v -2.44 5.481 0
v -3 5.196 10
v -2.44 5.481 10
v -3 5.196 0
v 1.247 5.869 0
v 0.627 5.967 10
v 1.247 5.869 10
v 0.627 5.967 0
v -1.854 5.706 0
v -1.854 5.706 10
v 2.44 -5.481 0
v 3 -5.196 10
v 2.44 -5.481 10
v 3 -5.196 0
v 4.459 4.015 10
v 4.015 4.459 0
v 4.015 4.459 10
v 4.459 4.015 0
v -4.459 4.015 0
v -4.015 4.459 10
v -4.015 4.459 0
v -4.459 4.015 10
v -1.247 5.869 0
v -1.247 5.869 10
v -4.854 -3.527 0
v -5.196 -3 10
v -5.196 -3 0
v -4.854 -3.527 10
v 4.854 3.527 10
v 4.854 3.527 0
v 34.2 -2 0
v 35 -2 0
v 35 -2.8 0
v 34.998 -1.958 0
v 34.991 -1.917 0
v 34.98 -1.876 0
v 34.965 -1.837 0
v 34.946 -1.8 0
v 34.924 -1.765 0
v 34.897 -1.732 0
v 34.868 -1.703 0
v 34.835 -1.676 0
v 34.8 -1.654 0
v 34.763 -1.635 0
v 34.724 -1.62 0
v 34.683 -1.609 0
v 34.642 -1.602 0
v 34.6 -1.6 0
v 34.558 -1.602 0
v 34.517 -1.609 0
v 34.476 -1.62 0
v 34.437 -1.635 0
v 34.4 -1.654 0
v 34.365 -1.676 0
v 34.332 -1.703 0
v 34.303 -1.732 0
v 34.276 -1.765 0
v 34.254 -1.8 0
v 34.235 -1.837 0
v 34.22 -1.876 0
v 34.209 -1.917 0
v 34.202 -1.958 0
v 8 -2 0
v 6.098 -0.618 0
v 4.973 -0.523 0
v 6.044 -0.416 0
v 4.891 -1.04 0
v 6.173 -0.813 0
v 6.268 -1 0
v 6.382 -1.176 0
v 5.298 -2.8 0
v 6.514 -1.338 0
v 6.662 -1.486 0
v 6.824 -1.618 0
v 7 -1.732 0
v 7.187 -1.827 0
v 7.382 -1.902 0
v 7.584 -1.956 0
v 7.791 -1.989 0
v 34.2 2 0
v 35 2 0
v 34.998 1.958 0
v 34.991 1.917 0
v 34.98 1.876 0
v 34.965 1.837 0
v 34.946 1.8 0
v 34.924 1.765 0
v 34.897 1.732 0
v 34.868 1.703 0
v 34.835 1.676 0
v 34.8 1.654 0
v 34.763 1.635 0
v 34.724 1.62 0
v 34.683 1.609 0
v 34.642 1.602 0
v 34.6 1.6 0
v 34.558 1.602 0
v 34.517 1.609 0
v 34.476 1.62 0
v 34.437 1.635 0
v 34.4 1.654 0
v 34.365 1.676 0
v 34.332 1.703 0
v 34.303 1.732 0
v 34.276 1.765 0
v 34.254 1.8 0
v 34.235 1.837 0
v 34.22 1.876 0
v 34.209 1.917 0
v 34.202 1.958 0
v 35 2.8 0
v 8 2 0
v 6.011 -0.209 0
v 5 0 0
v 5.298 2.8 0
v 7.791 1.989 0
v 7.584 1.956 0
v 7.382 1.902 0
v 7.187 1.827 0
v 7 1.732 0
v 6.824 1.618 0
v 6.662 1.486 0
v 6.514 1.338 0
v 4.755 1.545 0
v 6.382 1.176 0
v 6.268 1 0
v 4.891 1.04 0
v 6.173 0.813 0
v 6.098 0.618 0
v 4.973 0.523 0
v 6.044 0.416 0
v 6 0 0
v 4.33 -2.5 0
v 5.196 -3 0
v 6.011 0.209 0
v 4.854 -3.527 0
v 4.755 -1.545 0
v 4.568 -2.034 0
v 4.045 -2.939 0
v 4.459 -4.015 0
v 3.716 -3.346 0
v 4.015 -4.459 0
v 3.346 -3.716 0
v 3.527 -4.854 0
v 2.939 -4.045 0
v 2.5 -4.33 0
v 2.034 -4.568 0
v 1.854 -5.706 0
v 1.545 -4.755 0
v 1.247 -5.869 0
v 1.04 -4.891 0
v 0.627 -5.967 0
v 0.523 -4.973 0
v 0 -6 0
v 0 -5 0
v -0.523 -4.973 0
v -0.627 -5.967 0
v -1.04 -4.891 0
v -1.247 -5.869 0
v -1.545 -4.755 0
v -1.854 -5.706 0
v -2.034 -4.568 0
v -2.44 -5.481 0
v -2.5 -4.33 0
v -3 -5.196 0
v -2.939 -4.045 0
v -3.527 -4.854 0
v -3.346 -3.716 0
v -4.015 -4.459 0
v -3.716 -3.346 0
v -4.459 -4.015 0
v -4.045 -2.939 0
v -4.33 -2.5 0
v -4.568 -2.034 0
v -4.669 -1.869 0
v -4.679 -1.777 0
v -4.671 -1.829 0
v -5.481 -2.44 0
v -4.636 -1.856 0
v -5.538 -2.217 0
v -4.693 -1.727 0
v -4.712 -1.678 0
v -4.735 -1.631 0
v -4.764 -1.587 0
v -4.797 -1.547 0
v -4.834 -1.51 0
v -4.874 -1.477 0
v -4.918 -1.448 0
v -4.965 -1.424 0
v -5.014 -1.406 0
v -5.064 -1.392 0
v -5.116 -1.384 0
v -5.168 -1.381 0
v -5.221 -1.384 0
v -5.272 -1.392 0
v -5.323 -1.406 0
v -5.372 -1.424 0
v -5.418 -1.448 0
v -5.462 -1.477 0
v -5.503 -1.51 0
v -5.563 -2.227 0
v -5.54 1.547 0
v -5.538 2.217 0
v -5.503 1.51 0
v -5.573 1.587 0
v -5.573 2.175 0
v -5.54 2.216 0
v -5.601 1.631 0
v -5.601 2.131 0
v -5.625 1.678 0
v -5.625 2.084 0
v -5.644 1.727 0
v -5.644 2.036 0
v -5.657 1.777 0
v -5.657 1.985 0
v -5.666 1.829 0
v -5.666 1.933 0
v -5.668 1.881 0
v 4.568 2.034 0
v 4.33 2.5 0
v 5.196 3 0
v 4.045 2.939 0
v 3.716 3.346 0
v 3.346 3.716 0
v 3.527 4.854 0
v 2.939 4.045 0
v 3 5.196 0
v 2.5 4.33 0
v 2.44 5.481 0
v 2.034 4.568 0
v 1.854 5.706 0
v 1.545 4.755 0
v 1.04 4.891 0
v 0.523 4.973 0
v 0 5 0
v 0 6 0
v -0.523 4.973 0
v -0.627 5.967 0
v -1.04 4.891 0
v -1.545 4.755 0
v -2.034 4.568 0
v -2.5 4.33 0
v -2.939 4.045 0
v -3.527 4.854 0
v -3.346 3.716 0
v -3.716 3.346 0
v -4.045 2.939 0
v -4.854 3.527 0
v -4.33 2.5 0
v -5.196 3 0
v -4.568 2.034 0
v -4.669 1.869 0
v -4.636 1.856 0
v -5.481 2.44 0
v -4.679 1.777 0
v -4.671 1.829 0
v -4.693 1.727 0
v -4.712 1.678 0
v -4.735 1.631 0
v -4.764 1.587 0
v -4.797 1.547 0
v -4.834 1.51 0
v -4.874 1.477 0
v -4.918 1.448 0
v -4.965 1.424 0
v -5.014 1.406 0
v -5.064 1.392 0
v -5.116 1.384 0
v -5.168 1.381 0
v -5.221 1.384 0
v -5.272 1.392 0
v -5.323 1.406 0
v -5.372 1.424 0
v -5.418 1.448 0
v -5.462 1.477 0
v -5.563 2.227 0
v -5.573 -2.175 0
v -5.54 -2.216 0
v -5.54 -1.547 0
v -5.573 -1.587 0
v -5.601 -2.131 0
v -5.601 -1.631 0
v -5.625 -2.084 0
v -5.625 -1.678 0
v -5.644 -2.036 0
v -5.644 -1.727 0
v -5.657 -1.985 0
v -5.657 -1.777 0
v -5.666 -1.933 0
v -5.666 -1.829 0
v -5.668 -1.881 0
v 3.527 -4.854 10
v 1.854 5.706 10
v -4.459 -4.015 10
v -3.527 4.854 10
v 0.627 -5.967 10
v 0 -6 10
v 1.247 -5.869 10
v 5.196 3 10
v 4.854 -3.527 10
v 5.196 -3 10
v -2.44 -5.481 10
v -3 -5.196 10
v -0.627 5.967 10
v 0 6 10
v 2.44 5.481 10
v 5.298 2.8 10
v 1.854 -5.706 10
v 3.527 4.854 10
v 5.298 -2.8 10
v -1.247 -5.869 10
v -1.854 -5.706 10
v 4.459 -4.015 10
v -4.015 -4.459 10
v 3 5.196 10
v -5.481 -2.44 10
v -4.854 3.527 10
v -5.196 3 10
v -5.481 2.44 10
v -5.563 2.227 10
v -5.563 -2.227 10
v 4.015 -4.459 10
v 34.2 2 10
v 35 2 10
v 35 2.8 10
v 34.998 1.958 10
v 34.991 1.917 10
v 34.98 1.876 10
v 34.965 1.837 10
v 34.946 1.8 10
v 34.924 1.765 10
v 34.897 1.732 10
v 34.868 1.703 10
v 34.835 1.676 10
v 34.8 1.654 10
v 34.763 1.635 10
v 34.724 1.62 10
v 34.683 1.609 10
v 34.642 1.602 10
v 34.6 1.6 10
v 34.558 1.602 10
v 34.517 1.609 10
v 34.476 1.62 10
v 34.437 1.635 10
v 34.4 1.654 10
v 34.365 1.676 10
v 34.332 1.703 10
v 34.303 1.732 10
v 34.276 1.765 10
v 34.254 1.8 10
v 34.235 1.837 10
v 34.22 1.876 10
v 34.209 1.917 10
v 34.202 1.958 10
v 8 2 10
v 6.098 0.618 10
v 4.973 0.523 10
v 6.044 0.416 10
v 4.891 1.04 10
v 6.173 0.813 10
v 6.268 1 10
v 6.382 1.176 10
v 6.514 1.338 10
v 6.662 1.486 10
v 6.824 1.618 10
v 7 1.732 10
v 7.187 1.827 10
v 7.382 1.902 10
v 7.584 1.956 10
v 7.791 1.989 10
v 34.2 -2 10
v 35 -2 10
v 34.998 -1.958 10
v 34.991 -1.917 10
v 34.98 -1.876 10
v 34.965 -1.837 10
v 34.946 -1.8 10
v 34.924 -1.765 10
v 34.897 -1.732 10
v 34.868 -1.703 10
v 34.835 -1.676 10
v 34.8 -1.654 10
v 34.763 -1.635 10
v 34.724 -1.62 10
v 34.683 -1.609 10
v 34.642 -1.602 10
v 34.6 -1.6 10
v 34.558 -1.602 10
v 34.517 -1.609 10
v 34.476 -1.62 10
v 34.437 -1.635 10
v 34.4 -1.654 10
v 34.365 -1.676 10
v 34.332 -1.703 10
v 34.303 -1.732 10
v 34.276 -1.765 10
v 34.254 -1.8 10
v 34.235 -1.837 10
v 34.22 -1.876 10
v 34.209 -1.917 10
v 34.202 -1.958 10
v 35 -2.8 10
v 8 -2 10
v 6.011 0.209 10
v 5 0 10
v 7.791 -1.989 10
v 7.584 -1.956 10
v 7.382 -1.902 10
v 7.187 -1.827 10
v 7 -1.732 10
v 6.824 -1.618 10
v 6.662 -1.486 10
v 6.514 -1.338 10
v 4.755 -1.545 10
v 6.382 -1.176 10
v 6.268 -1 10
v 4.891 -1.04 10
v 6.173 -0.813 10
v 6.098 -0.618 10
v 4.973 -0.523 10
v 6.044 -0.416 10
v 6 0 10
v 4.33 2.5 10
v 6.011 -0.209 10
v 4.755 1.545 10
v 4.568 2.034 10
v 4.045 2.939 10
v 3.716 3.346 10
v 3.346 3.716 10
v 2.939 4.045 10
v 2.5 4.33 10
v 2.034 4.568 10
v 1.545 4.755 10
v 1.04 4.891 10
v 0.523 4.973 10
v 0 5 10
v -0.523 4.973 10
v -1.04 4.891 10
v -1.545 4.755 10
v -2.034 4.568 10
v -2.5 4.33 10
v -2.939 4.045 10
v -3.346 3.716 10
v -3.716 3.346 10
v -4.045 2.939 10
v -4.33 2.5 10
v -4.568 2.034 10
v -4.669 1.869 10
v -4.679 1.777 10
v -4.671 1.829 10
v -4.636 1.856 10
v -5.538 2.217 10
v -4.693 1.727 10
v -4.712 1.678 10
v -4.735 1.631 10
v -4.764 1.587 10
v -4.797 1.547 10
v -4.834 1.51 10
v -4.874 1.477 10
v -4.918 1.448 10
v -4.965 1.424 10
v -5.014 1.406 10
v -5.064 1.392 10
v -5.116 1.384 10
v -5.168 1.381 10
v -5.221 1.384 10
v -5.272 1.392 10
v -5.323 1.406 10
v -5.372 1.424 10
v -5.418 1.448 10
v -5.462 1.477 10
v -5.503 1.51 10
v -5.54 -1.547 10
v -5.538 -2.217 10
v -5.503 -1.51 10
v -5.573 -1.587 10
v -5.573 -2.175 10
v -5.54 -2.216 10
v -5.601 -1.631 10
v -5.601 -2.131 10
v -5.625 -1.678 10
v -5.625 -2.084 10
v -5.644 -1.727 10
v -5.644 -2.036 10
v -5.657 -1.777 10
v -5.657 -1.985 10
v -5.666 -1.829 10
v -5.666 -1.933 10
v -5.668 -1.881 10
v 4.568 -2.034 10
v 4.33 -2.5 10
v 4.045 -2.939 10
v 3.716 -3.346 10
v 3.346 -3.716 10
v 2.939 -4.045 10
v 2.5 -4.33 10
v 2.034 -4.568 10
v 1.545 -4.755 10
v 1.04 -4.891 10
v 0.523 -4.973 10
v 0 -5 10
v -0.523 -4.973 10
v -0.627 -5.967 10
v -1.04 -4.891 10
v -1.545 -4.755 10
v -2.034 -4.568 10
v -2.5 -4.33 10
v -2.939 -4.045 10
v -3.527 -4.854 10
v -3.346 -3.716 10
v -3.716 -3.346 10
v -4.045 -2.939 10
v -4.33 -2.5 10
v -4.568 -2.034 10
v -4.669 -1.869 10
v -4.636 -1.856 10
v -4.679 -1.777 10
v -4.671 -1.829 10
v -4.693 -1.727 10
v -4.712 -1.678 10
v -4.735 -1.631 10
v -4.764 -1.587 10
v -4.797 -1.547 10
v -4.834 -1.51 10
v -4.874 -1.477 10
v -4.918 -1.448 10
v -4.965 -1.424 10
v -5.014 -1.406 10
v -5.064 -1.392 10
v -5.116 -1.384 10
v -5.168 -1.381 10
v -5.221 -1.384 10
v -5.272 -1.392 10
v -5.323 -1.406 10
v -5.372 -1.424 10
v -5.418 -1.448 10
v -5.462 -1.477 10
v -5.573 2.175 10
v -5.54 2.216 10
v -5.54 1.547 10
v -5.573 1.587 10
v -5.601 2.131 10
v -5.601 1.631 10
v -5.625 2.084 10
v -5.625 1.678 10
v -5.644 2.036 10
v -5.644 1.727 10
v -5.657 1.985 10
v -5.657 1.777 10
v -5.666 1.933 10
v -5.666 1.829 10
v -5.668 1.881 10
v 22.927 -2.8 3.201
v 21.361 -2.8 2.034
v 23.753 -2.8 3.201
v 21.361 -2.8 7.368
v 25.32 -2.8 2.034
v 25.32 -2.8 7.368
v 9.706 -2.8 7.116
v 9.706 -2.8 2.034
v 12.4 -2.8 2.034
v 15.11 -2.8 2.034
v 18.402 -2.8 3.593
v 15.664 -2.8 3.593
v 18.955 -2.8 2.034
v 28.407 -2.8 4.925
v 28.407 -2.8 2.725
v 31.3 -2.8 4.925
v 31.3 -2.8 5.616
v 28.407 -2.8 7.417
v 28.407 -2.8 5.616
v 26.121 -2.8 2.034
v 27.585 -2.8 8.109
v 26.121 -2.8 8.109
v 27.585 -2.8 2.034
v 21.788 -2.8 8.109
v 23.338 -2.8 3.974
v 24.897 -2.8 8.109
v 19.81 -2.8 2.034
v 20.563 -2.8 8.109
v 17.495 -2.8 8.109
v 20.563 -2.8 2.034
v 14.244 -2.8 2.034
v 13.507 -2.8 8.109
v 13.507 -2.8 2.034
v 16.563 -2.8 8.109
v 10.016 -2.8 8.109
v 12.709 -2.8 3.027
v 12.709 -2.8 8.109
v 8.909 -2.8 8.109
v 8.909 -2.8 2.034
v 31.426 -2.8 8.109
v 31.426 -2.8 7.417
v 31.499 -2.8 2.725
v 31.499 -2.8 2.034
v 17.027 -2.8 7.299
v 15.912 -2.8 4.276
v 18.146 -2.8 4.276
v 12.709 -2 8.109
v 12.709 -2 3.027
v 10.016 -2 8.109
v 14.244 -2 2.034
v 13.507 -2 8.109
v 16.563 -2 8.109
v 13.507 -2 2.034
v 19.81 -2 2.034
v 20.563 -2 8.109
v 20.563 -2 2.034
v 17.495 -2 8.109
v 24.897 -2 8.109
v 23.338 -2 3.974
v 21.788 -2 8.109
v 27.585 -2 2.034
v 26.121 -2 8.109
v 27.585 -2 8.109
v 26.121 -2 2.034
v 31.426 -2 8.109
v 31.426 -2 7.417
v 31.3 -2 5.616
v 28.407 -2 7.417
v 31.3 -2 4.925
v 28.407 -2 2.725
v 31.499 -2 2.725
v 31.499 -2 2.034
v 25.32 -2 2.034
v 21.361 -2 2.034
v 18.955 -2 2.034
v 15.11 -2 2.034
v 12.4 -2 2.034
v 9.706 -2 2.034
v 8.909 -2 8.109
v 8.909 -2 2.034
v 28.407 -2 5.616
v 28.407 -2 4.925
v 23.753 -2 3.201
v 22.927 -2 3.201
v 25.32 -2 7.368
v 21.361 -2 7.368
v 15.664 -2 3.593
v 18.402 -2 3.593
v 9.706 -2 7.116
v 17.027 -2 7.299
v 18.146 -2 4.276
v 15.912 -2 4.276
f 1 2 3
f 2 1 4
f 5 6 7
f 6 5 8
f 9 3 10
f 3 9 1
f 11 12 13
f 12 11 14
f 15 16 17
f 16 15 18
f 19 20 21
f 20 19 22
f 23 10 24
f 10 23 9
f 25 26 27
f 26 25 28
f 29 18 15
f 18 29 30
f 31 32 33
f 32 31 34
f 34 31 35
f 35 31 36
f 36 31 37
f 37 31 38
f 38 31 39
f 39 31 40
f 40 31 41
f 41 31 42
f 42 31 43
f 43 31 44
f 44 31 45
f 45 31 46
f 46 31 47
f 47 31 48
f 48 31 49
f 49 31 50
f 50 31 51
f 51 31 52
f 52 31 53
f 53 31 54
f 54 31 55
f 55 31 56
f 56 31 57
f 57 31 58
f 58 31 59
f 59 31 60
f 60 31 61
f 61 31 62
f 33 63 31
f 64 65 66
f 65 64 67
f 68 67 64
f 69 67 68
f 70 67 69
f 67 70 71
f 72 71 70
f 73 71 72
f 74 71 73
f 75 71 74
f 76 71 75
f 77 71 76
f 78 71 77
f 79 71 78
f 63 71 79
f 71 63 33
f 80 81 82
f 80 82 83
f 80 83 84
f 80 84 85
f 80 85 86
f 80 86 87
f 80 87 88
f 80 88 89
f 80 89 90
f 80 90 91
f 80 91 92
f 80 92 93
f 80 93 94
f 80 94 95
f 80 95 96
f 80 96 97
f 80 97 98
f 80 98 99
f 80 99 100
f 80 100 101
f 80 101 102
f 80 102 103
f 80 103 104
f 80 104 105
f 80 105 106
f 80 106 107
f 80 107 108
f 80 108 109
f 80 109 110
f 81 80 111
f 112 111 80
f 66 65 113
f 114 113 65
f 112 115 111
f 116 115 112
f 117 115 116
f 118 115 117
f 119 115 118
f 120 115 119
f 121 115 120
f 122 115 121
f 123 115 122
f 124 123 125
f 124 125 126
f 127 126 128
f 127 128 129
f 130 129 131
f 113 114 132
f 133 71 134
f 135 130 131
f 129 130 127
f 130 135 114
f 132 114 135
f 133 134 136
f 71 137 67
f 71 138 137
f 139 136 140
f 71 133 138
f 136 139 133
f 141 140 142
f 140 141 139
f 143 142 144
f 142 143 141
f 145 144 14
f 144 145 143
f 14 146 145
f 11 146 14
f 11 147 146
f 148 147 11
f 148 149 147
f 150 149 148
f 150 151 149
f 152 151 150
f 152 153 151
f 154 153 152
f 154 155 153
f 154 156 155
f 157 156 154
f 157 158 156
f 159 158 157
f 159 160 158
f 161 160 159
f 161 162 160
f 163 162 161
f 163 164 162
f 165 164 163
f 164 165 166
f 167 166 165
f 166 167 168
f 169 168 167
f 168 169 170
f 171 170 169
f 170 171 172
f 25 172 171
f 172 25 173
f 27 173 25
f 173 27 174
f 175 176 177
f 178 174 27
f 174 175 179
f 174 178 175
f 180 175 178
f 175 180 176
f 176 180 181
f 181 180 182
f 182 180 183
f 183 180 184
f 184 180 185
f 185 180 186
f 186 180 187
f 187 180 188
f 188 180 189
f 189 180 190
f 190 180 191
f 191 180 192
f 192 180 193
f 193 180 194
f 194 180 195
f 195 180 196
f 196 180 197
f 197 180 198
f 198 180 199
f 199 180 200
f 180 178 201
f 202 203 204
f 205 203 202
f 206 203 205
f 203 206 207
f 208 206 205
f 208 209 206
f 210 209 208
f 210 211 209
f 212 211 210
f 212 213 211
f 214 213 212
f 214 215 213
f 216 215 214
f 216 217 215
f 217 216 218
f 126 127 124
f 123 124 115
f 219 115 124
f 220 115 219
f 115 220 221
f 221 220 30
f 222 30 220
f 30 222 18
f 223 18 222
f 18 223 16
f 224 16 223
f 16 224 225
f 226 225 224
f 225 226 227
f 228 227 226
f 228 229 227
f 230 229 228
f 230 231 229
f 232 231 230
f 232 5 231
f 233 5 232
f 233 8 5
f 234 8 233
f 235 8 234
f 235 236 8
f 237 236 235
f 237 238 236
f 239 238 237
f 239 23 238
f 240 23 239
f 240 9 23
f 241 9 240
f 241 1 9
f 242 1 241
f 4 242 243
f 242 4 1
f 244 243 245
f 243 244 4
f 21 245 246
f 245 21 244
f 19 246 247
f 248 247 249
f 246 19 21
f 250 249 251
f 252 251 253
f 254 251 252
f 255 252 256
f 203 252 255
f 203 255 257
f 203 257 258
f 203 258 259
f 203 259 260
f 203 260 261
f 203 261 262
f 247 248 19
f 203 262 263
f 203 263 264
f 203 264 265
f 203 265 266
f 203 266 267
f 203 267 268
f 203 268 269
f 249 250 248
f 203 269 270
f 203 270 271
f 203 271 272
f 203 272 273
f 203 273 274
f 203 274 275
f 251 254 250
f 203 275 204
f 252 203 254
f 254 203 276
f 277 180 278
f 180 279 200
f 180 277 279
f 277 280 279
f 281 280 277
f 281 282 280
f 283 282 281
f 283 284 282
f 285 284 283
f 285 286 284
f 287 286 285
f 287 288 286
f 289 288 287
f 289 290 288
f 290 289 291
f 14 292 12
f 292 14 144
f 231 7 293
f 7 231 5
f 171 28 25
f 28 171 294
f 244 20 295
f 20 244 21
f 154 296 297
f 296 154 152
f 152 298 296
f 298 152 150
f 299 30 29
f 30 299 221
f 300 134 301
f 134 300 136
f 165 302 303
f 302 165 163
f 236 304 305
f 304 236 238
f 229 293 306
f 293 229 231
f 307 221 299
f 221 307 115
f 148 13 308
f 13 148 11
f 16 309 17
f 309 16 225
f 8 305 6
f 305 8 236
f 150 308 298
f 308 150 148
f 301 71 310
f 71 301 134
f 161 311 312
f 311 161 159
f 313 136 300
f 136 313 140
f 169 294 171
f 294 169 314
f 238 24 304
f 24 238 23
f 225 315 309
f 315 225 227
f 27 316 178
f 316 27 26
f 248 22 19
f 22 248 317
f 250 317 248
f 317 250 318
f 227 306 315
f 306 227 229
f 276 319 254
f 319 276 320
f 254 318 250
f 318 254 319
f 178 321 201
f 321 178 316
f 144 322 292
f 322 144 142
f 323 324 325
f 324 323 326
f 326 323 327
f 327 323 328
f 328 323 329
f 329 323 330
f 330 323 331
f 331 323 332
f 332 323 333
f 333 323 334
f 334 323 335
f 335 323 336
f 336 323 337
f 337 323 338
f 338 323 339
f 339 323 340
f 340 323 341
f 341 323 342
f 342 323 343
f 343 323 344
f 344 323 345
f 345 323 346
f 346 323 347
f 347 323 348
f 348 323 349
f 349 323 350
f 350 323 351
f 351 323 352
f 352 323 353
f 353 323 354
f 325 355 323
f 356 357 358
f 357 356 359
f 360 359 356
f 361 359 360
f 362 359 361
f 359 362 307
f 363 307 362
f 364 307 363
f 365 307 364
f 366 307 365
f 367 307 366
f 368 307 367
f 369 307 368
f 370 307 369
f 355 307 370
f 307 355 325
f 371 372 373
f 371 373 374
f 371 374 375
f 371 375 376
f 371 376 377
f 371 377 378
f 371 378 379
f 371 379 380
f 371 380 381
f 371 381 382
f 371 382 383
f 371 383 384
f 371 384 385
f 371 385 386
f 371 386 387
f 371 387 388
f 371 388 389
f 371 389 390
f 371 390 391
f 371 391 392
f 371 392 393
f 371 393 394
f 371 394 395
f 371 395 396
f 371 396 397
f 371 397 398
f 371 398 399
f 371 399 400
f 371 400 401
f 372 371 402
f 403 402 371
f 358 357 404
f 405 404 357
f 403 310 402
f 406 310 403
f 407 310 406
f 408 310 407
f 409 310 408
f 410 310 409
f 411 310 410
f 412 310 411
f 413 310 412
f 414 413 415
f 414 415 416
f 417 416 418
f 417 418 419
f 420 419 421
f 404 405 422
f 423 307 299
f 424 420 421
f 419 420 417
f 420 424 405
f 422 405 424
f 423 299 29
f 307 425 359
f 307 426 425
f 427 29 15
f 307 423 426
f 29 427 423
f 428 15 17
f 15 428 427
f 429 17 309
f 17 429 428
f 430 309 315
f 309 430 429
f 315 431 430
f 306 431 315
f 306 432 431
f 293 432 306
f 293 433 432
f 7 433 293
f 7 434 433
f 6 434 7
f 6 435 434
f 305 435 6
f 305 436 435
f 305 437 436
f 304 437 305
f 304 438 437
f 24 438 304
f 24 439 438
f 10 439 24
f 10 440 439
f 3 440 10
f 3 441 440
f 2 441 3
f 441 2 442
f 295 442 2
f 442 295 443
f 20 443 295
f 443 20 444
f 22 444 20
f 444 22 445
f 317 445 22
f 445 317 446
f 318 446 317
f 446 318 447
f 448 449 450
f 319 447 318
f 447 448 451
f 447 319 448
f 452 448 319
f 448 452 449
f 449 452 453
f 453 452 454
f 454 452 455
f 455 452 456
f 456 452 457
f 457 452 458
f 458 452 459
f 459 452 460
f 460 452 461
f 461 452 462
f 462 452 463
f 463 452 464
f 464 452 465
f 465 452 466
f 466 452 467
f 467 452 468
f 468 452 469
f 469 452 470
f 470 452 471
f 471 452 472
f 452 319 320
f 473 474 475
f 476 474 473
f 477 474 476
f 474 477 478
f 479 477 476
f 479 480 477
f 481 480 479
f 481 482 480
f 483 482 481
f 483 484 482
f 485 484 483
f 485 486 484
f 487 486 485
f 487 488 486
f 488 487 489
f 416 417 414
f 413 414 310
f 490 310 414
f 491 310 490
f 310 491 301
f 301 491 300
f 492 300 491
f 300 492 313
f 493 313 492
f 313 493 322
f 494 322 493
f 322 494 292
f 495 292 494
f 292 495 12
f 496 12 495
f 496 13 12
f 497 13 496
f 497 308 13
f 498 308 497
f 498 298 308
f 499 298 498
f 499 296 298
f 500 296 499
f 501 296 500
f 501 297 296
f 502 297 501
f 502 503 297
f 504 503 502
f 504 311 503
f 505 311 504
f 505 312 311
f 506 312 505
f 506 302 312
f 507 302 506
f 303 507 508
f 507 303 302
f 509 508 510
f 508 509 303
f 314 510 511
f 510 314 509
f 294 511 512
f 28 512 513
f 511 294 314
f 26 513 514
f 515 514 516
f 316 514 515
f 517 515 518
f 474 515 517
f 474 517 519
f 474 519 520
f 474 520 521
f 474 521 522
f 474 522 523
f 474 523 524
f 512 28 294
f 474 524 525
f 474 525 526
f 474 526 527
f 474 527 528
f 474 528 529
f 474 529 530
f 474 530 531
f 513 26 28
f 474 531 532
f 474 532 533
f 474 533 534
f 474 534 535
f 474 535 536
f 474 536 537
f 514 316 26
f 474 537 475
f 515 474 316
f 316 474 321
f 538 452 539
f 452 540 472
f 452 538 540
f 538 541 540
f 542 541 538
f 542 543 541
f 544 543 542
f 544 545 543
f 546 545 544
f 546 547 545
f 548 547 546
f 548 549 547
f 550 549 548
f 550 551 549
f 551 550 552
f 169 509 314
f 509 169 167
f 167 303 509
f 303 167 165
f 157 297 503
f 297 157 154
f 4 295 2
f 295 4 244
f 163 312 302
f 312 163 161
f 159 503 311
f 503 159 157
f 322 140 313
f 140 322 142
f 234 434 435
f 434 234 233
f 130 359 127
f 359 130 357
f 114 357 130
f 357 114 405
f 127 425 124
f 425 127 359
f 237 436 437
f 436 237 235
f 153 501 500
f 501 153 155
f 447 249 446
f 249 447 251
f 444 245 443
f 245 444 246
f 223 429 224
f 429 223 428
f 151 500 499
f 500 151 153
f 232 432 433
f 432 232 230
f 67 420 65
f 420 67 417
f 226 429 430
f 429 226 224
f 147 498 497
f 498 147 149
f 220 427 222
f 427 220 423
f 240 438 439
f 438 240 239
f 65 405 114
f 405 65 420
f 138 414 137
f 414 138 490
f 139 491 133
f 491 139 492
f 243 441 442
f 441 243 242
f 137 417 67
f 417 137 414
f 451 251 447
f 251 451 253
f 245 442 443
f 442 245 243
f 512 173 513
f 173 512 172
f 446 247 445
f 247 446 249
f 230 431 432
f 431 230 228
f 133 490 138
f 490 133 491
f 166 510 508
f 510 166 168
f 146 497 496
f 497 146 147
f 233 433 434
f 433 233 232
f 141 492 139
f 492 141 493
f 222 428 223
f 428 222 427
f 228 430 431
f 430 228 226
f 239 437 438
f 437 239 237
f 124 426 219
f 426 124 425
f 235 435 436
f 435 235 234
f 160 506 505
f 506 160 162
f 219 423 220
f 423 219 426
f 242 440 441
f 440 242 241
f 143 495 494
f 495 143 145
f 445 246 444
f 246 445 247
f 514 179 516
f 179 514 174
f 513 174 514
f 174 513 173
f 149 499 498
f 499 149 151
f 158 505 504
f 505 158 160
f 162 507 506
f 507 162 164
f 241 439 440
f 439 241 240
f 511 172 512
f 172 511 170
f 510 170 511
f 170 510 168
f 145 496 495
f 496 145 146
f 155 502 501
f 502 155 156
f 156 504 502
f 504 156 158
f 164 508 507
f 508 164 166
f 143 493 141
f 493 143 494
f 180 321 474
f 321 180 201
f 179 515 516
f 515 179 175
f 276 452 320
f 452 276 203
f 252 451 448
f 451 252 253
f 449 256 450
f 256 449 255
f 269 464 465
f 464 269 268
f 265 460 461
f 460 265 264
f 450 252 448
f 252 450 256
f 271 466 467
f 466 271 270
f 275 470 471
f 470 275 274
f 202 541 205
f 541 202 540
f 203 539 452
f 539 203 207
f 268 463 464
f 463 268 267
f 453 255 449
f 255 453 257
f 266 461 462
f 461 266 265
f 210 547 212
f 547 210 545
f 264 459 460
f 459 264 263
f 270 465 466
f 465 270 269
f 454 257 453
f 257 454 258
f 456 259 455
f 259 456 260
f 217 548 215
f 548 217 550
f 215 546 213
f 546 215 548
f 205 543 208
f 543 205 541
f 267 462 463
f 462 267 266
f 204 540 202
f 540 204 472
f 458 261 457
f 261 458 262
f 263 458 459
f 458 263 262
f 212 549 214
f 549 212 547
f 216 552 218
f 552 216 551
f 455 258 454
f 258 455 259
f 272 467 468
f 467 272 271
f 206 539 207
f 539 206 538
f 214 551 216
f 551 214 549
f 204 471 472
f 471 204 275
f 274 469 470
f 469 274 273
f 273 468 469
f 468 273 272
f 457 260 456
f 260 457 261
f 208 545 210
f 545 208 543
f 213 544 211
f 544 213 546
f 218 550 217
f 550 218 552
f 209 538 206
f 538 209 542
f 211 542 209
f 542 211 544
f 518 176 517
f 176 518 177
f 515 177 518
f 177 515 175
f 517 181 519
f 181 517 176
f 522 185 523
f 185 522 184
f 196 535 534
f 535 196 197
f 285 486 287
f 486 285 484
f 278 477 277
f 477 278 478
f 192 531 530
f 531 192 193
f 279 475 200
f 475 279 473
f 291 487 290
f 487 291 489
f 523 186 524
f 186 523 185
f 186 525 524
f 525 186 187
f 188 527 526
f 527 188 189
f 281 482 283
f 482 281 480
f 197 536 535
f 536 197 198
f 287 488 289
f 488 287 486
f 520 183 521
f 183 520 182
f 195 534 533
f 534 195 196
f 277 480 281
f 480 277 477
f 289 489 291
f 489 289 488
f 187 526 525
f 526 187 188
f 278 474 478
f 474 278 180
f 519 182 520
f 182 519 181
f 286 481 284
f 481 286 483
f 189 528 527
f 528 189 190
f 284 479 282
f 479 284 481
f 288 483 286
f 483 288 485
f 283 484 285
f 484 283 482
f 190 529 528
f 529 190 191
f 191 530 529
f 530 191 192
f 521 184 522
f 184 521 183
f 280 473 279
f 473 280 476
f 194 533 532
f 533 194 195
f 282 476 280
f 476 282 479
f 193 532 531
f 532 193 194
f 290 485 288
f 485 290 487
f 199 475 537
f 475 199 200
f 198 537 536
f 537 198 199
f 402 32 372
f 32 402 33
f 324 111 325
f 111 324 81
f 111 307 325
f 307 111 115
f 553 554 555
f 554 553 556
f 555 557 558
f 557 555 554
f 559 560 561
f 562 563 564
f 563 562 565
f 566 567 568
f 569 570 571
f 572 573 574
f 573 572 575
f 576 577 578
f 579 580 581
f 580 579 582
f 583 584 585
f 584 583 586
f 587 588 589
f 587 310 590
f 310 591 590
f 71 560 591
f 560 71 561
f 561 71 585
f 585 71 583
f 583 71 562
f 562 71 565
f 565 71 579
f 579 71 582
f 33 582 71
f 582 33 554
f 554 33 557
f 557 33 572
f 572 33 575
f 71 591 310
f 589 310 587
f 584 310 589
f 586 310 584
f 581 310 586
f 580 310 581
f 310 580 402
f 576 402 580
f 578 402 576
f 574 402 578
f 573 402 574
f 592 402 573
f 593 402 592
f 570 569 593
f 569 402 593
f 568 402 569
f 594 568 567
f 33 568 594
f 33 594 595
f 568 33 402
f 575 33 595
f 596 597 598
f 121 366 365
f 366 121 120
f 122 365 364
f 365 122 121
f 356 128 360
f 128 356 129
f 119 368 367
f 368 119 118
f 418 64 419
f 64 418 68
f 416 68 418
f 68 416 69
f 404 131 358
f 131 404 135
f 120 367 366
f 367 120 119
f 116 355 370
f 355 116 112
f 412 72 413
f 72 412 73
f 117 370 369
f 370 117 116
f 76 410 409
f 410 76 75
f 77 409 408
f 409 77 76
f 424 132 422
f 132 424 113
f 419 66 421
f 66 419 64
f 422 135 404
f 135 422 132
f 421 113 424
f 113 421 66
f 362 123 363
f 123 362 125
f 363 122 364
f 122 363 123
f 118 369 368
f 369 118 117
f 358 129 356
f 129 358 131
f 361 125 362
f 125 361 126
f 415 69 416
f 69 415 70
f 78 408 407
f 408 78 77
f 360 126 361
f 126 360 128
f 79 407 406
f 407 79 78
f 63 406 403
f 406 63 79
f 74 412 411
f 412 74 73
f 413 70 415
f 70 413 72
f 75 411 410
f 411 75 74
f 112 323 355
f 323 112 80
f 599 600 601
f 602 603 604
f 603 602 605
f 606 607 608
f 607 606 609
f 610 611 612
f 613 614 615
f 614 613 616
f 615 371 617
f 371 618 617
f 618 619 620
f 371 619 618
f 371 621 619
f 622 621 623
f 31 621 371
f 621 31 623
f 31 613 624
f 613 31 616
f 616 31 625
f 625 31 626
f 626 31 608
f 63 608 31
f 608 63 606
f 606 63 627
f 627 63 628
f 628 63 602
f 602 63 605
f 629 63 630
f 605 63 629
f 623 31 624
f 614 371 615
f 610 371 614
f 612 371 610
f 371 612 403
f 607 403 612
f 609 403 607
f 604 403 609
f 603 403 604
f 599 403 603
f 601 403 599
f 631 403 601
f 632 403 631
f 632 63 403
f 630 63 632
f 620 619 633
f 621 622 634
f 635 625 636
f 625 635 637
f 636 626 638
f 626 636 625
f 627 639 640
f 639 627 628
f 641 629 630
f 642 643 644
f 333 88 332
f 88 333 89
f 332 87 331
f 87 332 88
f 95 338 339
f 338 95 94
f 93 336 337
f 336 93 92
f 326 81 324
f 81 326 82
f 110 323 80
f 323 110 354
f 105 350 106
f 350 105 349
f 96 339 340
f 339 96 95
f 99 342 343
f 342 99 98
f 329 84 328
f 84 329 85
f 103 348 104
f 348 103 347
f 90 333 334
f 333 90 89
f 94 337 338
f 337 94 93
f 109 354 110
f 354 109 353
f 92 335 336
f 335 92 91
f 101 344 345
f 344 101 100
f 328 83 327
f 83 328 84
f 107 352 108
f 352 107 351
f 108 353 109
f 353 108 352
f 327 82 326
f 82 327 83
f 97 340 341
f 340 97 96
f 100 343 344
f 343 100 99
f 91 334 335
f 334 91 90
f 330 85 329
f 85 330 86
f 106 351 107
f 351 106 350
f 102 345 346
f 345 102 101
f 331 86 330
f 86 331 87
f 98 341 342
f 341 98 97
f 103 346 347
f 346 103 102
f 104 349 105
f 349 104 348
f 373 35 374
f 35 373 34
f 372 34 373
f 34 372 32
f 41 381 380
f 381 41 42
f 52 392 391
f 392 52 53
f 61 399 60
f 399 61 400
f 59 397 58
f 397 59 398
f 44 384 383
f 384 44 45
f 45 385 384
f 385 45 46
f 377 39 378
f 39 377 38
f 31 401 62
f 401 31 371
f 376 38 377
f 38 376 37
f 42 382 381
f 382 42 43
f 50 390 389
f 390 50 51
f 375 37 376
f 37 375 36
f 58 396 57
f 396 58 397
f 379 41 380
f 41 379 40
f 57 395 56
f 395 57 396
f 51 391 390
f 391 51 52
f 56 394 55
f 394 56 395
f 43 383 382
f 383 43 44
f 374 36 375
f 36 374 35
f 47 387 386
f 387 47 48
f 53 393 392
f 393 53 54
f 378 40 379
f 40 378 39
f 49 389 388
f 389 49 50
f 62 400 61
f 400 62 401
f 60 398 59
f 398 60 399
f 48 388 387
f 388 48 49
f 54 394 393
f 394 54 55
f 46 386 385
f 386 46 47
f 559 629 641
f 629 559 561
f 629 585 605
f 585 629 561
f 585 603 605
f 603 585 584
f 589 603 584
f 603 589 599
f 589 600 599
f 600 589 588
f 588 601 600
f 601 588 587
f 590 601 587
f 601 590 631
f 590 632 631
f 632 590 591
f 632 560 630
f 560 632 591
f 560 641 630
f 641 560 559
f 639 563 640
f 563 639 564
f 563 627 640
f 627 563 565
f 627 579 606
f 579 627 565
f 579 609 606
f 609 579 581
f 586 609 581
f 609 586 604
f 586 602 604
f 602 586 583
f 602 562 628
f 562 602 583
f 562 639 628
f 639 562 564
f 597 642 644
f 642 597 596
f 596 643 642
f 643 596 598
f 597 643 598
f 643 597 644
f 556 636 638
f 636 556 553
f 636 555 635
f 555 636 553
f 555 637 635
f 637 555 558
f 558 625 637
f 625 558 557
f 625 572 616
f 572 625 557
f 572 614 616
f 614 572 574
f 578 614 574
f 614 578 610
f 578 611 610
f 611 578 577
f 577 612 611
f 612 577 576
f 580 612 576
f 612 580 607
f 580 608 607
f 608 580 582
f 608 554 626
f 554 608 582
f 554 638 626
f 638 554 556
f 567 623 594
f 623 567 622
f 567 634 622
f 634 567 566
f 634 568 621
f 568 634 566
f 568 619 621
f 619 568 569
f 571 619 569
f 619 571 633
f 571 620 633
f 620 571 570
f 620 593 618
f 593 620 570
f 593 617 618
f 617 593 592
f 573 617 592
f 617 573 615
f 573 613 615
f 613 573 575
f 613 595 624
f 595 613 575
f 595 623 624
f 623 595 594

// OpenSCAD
// Diameter of the pen
diameter=10;

// Width of the piece
width = 10;

// Lenght of the clip
length=30;

//Separation of the clip arms
sep = 4;

// Wall thickness of the pen holder
wt = 1;

// Wall thickness of the clip
wt2 = 0.8;

// Text 
t = "NAME";

// Text Size
textSize = 6;

// Font type (you can use any Google Font but consider any stencil font for better results)
font = "Stencil";
/* [Hidden] */

$fn=60;
ang=40;

height=width;


penHolder();
difference() {
    clip();
    textOnClip();
}

module textOnClip() {
    translate ([diameter/2+length/2, -sep/2+1, height/2])
    rotate([90, 0, 0])
    linear_extrude(height=wt2+2)
    text(t, font=font, size=textSize, valign="center", halign="center", style="bold");
}

module penHolder() {
    difference() {
        cylinder (d=diameter+wt*2, h=height);
        translate([0, 0, -1]) cylinder (d=diameter, h=height+2);
        translate([0, 0, -1]) linear_extrude(height=height+2)
        polygon(points=[[0,0], [-cos(ang/2)*(diameter), sin(ang/2)*(diameter+1)], [-cos(ang/2)*(diameter), -sin(ang/2)*(diameter+1)]]);
    }
    translate([-cos(ang/2)*(diameter/2+wt/2), sin(ang/2)*(diameter/2+wt/2), 0]) cylinder(d=wt, h=height);
translate([-cos(ang/2)*(diameter/2+wt/2), -sin(ang/2)*(diameter/2+wt/2), 0]) cylinder(d=wt, h=height);
}

module clip() {
    
    r1 = wt2 * 0.5;
    
    difference() {
        translate([diameter/2, -sep/2-wt2, 0]) cube([length, sep+wt2*2, height]);
        translate([diameter/2+wt+sep/2, 0, -1])cylinder(d=sep, h=height+2);
        translate([diameter/2+wt+sep/2, -sep/2, -1]) cube([length, sep, height+2]);
    }
    translate([diameter/2+length-r1, sep/2, 0]) cylinder(r=r1, h=height);
    translate([diameter/2+length-r1, -sep/2, 0]) cylinder(r=r1, h=height);
    
}
